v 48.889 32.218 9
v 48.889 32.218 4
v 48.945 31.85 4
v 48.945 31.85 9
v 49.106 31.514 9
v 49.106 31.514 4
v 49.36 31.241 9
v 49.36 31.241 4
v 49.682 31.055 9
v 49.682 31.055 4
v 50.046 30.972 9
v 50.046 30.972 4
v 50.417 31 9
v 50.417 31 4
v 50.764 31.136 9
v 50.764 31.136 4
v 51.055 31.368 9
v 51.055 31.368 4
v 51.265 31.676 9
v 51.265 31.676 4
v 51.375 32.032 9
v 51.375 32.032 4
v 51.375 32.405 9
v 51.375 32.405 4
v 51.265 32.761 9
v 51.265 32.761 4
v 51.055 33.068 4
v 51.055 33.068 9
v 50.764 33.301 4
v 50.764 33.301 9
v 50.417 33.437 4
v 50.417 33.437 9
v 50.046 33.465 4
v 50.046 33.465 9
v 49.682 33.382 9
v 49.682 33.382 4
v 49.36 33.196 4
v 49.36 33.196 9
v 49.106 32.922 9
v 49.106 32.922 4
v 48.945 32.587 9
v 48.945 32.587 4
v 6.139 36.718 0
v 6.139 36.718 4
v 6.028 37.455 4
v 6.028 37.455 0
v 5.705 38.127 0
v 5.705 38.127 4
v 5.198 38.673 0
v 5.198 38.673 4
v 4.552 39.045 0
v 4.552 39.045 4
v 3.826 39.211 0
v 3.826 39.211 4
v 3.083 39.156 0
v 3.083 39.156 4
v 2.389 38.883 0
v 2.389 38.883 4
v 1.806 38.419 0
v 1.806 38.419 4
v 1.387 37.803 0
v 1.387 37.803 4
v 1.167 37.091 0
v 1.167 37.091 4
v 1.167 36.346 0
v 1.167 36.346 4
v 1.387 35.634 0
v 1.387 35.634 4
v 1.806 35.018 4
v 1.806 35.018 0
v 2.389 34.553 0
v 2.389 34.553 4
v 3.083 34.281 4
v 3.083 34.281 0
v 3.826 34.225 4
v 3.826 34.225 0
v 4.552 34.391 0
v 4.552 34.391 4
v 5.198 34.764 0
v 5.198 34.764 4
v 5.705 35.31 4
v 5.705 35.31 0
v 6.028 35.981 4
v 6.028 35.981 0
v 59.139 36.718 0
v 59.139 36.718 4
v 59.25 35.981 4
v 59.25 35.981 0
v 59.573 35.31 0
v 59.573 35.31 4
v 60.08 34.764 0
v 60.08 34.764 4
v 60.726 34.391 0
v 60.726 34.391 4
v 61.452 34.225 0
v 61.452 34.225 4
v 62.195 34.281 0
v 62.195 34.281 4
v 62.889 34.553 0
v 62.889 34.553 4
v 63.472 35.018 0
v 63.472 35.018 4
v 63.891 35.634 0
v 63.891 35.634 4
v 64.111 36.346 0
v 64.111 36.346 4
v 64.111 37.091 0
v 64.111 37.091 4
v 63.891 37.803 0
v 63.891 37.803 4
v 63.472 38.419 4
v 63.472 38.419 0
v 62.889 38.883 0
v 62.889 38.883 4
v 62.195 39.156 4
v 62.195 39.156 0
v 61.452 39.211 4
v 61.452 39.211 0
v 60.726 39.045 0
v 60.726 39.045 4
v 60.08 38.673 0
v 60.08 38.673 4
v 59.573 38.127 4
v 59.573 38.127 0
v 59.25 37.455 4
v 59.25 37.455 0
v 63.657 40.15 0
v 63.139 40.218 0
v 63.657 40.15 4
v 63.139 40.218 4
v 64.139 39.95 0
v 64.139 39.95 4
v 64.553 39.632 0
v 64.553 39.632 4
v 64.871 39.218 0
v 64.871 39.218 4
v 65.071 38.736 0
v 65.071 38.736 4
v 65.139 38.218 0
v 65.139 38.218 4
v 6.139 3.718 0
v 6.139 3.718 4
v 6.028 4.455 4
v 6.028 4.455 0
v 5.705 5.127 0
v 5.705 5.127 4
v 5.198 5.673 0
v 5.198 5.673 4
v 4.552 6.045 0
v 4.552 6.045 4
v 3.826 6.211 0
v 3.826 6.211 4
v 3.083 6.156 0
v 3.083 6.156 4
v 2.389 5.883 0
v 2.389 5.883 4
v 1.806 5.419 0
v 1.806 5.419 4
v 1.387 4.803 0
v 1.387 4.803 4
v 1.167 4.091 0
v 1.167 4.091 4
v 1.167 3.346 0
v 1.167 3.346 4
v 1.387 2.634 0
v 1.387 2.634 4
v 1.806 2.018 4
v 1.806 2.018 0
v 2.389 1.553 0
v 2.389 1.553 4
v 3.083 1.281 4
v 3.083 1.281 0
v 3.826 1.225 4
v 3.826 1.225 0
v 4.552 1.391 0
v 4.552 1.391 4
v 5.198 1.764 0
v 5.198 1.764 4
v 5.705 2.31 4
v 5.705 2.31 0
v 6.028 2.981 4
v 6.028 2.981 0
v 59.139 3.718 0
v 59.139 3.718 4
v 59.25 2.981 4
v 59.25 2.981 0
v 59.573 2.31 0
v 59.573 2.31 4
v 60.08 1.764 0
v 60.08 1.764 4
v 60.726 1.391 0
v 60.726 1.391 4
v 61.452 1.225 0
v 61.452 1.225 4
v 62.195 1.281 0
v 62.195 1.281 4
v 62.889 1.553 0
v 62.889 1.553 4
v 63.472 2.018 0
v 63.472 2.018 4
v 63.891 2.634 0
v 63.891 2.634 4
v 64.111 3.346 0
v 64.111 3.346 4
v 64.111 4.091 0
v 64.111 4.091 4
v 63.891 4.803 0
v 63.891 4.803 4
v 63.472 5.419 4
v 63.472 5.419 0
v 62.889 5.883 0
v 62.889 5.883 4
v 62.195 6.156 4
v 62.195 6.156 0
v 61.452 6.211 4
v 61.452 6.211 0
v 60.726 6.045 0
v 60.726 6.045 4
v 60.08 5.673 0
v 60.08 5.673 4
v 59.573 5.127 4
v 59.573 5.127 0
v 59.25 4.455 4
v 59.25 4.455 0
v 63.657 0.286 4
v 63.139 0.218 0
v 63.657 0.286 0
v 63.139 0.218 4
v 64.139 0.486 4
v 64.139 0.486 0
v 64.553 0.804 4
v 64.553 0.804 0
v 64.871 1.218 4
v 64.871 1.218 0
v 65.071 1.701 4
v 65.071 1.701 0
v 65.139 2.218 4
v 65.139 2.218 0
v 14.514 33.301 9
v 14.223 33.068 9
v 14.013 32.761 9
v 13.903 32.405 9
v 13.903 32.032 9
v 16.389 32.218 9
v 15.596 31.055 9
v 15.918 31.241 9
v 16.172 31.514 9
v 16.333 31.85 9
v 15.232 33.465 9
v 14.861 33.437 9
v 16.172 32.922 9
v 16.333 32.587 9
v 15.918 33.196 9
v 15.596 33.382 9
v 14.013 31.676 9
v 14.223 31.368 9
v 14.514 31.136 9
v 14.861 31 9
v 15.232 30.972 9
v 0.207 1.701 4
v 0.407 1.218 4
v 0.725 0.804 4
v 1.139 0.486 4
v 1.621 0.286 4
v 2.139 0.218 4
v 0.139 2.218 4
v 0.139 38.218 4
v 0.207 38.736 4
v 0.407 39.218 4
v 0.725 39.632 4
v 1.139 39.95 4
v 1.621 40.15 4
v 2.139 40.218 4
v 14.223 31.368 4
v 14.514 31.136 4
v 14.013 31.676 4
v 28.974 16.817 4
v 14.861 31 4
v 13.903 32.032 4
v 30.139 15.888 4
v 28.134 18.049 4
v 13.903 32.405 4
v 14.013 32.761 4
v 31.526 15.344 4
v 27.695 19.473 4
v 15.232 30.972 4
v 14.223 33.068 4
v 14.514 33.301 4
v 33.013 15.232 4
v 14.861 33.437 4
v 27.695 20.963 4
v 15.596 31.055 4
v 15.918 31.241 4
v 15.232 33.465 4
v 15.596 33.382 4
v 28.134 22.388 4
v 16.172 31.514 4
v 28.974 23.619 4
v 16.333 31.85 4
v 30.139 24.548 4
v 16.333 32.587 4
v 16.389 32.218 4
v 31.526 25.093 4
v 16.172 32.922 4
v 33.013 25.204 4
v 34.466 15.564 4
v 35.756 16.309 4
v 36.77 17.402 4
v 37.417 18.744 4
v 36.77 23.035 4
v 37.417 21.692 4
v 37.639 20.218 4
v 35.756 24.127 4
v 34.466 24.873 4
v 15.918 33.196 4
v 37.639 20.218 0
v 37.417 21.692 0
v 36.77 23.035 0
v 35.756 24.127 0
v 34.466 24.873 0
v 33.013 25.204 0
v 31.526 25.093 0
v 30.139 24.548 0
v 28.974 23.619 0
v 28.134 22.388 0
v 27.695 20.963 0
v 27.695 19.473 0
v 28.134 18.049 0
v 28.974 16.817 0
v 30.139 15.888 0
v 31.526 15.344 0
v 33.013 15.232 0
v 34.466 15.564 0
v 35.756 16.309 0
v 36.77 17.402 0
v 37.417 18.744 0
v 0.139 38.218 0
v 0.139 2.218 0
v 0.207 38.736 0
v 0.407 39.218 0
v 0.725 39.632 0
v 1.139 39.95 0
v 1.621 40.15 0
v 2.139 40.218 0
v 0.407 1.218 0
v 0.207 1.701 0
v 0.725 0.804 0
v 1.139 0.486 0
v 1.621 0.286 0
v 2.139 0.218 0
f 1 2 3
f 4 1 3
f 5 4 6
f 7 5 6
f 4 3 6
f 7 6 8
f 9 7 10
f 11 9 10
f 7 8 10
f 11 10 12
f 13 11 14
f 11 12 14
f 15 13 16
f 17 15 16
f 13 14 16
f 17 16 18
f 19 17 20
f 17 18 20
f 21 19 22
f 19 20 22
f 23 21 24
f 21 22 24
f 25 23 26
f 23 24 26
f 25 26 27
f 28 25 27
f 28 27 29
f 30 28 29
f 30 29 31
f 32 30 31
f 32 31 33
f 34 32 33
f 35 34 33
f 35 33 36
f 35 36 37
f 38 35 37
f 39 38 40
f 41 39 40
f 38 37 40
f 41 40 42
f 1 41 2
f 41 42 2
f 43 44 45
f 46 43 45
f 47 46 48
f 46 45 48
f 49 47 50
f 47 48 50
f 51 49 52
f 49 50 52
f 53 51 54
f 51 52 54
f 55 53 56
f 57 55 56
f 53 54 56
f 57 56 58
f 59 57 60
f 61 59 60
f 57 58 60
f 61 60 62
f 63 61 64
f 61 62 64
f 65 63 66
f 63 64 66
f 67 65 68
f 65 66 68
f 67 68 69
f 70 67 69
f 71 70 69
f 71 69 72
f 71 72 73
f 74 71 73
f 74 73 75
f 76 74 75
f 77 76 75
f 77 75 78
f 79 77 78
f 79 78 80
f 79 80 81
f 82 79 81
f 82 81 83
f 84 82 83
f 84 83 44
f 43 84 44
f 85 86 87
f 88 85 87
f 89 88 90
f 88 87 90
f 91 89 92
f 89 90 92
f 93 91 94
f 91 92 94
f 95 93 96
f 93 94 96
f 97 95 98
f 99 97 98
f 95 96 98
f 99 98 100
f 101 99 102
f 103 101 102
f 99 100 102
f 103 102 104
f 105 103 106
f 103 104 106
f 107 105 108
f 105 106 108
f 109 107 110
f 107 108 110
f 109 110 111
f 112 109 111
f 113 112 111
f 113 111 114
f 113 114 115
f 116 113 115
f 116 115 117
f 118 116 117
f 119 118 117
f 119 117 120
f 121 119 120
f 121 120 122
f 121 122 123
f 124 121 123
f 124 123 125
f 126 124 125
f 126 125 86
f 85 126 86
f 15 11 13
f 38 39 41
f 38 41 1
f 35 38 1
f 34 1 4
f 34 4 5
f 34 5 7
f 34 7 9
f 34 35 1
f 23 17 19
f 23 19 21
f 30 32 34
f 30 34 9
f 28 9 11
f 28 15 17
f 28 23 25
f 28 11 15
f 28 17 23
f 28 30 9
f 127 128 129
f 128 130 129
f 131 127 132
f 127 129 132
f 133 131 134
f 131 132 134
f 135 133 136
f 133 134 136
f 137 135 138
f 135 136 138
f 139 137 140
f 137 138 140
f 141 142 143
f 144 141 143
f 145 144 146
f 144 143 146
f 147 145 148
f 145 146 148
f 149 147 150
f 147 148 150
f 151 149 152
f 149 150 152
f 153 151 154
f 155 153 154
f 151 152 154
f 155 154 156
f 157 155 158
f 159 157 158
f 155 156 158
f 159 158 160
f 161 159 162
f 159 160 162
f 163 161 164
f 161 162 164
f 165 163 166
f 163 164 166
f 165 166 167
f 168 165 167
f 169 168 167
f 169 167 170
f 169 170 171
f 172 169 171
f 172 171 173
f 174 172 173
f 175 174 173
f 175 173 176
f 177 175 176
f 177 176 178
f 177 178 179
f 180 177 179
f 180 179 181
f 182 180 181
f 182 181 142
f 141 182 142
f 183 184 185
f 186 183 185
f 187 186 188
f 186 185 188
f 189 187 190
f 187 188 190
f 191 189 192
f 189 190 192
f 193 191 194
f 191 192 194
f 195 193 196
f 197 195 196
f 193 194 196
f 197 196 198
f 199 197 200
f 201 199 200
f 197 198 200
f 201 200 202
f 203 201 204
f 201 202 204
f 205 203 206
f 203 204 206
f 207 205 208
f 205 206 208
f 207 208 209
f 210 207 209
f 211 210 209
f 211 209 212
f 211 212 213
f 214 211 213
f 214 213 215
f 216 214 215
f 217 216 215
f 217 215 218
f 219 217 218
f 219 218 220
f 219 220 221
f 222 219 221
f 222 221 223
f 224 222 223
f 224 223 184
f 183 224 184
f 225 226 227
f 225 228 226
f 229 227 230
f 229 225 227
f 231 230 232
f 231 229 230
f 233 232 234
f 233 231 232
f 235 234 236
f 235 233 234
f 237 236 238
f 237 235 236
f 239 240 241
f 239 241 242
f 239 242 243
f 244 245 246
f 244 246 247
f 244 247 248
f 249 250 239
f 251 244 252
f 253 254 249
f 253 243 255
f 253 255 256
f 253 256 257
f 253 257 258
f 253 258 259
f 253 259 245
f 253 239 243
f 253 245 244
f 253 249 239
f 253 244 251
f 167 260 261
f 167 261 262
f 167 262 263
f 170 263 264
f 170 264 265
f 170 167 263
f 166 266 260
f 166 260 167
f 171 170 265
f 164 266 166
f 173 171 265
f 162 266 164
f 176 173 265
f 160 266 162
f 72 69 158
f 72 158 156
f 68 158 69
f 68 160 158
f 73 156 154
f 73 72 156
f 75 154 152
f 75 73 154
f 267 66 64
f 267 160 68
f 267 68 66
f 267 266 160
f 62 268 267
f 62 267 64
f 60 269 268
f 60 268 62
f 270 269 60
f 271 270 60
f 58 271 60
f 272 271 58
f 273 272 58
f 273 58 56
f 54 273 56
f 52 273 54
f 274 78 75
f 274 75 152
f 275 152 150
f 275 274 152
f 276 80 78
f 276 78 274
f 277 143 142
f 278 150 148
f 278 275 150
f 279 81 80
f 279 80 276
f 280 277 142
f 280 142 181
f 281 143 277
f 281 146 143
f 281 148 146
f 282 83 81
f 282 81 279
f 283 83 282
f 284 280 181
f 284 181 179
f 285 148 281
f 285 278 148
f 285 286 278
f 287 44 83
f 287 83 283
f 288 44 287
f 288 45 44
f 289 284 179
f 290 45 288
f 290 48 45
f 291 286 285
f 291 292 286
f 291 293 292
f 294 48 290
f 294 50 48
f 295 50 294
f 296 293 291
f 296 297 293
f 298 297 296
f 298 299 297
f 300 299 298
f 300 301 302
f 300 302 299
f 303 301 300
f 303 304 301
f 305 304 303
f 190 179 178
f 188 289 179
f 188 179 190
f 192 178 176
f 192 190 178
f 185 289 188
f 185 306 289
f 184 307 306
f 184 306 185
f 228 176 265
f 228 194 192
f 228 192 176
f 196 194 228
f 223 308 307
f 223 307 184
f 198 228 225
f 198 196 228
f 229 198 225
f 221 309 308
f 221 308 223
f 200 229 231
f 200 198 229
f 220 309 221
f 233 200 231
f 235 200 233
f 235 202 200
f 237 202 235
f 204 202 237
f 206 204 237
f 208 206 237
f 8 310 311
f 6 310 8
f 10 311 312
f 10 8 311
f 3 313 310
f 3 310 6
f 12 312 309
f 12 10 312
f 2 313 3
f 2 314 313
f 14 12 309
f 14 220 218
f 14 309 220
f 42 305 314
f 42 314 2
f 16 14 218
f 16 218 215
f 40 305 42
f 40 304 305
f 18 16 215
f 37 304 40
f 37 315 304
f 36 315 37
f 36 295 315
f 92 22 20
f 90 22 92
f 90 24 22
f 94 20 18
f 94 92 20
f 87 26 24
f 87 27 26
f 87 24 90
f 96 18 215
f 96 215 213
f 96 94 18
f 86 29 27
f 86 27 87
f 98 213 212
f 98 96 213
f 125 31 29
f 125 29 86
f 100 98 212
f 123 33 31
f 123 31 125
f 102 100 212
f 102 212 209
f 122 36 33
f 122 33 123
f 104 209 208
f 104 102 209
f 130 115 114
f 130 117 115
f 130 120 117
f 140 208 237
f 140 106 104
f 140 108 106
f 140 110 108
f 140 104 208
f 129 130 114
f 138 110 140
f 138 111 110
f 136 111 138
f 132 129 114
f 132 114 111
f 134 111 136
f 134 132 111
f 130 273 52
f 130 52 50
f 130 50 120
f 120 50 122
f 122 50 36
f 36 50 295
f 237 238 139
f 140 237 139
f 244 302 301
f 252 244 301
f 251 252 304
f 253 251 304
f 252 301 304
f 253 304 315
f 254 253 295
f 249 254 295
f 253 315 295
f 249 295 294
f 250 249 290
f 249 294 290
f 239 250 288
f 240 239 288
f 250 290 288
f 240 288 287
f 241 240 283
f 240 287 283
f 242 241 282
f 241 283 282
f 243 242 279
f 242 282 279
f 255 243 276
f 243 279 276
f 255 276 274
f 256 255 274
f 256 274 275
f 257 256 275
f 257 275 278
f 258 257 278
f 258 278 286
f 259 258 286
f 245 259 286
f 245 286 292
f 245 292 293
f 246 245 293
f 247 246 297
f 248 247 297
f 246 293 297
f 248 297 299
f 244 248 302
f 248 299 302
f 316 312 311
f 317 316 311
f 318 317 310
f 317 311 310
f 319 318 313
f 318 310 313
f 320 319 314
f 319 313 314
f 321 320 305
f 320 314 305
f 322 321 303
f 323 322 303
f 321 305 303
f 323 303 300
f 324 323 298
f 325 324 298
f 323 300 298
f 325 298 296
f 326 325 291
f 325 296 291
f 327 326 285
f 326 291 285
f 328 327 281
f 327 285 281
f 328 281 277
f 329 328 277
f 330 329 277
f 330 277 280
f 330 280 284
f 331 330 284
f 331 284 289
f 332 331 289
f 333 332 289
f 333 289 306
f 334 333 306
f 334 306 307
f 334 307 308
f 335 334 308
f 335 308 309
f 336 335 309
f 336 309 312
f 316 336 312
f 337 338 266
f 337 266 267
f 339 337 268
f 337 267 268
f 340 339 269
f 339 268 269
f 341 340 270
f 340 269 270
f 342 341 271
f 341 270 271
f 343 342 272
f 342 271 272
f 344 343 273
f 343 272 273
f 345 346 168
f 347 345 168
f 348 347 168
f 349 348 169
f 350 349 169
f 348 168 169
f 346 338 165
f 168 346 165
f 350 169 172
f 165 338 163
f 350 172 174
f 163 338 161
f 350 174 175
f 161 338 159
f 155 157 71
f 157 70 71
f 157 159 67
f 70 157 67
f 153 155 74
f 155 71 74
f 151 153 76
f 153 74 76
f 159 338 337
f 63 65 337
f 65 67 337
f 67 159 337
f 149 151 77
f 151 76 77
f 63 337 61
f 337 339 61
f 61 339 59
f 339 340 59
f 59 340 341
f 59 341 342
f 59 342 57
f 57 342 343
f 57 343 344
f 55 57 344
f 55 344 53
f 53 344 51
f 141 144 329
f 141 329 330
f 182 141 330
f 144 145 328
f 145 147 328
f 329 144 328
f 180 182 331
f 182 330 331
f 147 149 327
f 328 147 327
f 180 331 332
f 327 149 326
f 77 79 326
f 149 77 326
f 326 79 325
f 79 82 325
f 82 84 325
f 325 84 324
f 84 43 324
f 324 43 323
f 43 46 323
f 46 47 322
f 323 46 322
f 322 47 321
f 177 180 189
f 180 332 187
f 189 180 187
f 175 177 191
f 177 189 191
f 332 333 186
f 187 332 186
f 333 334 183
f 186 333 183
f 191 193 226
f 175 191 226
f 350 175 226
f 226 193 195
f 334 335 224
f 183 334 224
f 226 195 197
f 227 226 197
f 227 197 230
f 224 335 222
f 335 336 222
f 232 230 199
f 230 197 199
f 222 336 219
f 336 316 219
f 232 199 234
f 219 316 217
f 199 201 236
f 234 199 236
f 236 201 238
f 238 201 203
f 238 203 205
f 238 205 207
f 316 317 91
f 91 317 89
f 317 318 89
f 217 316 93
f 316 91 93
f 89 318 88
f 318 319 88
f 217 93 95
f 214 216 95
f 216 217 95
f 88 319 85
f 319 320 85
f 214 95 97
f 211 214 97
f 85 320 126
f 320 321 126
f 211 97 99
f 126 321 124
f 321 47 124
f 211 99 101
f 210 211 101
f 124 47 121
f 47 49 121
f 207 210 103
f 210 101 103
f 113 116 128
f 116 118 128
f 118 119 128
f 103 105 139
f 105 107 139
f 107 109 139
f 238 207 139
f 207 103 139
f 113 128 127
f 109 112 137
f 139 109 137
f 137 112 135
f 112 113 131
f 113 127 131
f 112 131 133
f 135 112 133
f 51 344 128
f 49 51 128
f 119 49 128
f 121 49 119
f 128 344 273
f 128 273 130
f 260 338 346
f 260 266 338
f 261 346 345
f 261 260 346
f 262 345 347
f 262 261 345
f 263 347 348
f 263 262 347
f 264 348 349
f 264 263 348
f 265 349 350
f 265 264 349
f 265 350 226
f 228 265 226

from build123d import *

# Parameters (mm, degrees)
F0_W     = 65
F0_H     = 40
F1_DEPTH = 4
F2_R     = 5
F3_DEPTH = 25
F4_R     = 1.25
F5_DEPTH = 5
F6_R     = 2
F7_R     = 2.5
F8_DEPTH = 25


with BuildPart() as f1:
    # F0 (on Top) → F1 (new body)
    with BuildSketch(Plane.XY):
        with Locations((32.639029, 20.218261)):
            Rectangle(F0_W, F0_H)
    extrude(amount=F1_DEPTH)

    # F2 (on face) → F3 (cut)
    with BuildSketch(Plane.XY.offset(4)):
        with Locations((32.639029, 20.218261)):
            Circle(F2_R)
    extrude(amount=-F3_DEPTH, mode=Mode.SUBTRACT)

    # F4 (on face) → F5 (join)
    with BuildSketch(Plane.XY.offset(4)):
        with BuildLine():
            ThreePointArc((51.389029, 32.218261), (50.139029, 33.468261), (48.889029, 32.218261))
            ThreePointArc((48.889029, 32.218261), (50.139029, 30.968261), (51.389029, 32.218261))
        make_face()
        with Locations((15.139029, 32.218261)):
            Circle(F4_R)
    extrude(amount=F5_DEPTH)

    # F6
    f6_edges = [f1.edges().sort_by_distance(p)[0] for p in [
        (0.139029, 0.218261, 2),
        (65.139029, 0.218261, 2),
        (65.139029, 40.218261, 2),
        (0.139029, 40.218261, 2),
    ]]
    fillet(f6_edges, radius=F6_R)

    # F7 (on face) → F8 (cut)
    with BuildSketch(Plane.XY.offset(4)):
        with Locations((3.639029, 36.718261)):
            Circle(F7_R)
        with Locations((3.639029, 3.718261)):
            Circle(F7_R)
        with BuildLine():
            ThreePointArc((64.139029, 3.718261), (61.639029, 6.218261), (59.139029, 3.718261))
            ThreePointArc((59.139029, 3.718261), (61.639029, 1.218261), (64.139029, 3.718261))
        make_face()
        with BuildLine():
            ThreePointArc((64.139029, 36.718261), (61.639029, 39.218261), (59.139029, 36.718261))
            ThreePointArc((59.139029, 36.718261), (61.639029, 34.218261), (64.139029, 36.718261))
        make_face()
    extrude(amount=-F8_DEPTH, mode=Mode.SUBTRACT)


solid = f1.part
